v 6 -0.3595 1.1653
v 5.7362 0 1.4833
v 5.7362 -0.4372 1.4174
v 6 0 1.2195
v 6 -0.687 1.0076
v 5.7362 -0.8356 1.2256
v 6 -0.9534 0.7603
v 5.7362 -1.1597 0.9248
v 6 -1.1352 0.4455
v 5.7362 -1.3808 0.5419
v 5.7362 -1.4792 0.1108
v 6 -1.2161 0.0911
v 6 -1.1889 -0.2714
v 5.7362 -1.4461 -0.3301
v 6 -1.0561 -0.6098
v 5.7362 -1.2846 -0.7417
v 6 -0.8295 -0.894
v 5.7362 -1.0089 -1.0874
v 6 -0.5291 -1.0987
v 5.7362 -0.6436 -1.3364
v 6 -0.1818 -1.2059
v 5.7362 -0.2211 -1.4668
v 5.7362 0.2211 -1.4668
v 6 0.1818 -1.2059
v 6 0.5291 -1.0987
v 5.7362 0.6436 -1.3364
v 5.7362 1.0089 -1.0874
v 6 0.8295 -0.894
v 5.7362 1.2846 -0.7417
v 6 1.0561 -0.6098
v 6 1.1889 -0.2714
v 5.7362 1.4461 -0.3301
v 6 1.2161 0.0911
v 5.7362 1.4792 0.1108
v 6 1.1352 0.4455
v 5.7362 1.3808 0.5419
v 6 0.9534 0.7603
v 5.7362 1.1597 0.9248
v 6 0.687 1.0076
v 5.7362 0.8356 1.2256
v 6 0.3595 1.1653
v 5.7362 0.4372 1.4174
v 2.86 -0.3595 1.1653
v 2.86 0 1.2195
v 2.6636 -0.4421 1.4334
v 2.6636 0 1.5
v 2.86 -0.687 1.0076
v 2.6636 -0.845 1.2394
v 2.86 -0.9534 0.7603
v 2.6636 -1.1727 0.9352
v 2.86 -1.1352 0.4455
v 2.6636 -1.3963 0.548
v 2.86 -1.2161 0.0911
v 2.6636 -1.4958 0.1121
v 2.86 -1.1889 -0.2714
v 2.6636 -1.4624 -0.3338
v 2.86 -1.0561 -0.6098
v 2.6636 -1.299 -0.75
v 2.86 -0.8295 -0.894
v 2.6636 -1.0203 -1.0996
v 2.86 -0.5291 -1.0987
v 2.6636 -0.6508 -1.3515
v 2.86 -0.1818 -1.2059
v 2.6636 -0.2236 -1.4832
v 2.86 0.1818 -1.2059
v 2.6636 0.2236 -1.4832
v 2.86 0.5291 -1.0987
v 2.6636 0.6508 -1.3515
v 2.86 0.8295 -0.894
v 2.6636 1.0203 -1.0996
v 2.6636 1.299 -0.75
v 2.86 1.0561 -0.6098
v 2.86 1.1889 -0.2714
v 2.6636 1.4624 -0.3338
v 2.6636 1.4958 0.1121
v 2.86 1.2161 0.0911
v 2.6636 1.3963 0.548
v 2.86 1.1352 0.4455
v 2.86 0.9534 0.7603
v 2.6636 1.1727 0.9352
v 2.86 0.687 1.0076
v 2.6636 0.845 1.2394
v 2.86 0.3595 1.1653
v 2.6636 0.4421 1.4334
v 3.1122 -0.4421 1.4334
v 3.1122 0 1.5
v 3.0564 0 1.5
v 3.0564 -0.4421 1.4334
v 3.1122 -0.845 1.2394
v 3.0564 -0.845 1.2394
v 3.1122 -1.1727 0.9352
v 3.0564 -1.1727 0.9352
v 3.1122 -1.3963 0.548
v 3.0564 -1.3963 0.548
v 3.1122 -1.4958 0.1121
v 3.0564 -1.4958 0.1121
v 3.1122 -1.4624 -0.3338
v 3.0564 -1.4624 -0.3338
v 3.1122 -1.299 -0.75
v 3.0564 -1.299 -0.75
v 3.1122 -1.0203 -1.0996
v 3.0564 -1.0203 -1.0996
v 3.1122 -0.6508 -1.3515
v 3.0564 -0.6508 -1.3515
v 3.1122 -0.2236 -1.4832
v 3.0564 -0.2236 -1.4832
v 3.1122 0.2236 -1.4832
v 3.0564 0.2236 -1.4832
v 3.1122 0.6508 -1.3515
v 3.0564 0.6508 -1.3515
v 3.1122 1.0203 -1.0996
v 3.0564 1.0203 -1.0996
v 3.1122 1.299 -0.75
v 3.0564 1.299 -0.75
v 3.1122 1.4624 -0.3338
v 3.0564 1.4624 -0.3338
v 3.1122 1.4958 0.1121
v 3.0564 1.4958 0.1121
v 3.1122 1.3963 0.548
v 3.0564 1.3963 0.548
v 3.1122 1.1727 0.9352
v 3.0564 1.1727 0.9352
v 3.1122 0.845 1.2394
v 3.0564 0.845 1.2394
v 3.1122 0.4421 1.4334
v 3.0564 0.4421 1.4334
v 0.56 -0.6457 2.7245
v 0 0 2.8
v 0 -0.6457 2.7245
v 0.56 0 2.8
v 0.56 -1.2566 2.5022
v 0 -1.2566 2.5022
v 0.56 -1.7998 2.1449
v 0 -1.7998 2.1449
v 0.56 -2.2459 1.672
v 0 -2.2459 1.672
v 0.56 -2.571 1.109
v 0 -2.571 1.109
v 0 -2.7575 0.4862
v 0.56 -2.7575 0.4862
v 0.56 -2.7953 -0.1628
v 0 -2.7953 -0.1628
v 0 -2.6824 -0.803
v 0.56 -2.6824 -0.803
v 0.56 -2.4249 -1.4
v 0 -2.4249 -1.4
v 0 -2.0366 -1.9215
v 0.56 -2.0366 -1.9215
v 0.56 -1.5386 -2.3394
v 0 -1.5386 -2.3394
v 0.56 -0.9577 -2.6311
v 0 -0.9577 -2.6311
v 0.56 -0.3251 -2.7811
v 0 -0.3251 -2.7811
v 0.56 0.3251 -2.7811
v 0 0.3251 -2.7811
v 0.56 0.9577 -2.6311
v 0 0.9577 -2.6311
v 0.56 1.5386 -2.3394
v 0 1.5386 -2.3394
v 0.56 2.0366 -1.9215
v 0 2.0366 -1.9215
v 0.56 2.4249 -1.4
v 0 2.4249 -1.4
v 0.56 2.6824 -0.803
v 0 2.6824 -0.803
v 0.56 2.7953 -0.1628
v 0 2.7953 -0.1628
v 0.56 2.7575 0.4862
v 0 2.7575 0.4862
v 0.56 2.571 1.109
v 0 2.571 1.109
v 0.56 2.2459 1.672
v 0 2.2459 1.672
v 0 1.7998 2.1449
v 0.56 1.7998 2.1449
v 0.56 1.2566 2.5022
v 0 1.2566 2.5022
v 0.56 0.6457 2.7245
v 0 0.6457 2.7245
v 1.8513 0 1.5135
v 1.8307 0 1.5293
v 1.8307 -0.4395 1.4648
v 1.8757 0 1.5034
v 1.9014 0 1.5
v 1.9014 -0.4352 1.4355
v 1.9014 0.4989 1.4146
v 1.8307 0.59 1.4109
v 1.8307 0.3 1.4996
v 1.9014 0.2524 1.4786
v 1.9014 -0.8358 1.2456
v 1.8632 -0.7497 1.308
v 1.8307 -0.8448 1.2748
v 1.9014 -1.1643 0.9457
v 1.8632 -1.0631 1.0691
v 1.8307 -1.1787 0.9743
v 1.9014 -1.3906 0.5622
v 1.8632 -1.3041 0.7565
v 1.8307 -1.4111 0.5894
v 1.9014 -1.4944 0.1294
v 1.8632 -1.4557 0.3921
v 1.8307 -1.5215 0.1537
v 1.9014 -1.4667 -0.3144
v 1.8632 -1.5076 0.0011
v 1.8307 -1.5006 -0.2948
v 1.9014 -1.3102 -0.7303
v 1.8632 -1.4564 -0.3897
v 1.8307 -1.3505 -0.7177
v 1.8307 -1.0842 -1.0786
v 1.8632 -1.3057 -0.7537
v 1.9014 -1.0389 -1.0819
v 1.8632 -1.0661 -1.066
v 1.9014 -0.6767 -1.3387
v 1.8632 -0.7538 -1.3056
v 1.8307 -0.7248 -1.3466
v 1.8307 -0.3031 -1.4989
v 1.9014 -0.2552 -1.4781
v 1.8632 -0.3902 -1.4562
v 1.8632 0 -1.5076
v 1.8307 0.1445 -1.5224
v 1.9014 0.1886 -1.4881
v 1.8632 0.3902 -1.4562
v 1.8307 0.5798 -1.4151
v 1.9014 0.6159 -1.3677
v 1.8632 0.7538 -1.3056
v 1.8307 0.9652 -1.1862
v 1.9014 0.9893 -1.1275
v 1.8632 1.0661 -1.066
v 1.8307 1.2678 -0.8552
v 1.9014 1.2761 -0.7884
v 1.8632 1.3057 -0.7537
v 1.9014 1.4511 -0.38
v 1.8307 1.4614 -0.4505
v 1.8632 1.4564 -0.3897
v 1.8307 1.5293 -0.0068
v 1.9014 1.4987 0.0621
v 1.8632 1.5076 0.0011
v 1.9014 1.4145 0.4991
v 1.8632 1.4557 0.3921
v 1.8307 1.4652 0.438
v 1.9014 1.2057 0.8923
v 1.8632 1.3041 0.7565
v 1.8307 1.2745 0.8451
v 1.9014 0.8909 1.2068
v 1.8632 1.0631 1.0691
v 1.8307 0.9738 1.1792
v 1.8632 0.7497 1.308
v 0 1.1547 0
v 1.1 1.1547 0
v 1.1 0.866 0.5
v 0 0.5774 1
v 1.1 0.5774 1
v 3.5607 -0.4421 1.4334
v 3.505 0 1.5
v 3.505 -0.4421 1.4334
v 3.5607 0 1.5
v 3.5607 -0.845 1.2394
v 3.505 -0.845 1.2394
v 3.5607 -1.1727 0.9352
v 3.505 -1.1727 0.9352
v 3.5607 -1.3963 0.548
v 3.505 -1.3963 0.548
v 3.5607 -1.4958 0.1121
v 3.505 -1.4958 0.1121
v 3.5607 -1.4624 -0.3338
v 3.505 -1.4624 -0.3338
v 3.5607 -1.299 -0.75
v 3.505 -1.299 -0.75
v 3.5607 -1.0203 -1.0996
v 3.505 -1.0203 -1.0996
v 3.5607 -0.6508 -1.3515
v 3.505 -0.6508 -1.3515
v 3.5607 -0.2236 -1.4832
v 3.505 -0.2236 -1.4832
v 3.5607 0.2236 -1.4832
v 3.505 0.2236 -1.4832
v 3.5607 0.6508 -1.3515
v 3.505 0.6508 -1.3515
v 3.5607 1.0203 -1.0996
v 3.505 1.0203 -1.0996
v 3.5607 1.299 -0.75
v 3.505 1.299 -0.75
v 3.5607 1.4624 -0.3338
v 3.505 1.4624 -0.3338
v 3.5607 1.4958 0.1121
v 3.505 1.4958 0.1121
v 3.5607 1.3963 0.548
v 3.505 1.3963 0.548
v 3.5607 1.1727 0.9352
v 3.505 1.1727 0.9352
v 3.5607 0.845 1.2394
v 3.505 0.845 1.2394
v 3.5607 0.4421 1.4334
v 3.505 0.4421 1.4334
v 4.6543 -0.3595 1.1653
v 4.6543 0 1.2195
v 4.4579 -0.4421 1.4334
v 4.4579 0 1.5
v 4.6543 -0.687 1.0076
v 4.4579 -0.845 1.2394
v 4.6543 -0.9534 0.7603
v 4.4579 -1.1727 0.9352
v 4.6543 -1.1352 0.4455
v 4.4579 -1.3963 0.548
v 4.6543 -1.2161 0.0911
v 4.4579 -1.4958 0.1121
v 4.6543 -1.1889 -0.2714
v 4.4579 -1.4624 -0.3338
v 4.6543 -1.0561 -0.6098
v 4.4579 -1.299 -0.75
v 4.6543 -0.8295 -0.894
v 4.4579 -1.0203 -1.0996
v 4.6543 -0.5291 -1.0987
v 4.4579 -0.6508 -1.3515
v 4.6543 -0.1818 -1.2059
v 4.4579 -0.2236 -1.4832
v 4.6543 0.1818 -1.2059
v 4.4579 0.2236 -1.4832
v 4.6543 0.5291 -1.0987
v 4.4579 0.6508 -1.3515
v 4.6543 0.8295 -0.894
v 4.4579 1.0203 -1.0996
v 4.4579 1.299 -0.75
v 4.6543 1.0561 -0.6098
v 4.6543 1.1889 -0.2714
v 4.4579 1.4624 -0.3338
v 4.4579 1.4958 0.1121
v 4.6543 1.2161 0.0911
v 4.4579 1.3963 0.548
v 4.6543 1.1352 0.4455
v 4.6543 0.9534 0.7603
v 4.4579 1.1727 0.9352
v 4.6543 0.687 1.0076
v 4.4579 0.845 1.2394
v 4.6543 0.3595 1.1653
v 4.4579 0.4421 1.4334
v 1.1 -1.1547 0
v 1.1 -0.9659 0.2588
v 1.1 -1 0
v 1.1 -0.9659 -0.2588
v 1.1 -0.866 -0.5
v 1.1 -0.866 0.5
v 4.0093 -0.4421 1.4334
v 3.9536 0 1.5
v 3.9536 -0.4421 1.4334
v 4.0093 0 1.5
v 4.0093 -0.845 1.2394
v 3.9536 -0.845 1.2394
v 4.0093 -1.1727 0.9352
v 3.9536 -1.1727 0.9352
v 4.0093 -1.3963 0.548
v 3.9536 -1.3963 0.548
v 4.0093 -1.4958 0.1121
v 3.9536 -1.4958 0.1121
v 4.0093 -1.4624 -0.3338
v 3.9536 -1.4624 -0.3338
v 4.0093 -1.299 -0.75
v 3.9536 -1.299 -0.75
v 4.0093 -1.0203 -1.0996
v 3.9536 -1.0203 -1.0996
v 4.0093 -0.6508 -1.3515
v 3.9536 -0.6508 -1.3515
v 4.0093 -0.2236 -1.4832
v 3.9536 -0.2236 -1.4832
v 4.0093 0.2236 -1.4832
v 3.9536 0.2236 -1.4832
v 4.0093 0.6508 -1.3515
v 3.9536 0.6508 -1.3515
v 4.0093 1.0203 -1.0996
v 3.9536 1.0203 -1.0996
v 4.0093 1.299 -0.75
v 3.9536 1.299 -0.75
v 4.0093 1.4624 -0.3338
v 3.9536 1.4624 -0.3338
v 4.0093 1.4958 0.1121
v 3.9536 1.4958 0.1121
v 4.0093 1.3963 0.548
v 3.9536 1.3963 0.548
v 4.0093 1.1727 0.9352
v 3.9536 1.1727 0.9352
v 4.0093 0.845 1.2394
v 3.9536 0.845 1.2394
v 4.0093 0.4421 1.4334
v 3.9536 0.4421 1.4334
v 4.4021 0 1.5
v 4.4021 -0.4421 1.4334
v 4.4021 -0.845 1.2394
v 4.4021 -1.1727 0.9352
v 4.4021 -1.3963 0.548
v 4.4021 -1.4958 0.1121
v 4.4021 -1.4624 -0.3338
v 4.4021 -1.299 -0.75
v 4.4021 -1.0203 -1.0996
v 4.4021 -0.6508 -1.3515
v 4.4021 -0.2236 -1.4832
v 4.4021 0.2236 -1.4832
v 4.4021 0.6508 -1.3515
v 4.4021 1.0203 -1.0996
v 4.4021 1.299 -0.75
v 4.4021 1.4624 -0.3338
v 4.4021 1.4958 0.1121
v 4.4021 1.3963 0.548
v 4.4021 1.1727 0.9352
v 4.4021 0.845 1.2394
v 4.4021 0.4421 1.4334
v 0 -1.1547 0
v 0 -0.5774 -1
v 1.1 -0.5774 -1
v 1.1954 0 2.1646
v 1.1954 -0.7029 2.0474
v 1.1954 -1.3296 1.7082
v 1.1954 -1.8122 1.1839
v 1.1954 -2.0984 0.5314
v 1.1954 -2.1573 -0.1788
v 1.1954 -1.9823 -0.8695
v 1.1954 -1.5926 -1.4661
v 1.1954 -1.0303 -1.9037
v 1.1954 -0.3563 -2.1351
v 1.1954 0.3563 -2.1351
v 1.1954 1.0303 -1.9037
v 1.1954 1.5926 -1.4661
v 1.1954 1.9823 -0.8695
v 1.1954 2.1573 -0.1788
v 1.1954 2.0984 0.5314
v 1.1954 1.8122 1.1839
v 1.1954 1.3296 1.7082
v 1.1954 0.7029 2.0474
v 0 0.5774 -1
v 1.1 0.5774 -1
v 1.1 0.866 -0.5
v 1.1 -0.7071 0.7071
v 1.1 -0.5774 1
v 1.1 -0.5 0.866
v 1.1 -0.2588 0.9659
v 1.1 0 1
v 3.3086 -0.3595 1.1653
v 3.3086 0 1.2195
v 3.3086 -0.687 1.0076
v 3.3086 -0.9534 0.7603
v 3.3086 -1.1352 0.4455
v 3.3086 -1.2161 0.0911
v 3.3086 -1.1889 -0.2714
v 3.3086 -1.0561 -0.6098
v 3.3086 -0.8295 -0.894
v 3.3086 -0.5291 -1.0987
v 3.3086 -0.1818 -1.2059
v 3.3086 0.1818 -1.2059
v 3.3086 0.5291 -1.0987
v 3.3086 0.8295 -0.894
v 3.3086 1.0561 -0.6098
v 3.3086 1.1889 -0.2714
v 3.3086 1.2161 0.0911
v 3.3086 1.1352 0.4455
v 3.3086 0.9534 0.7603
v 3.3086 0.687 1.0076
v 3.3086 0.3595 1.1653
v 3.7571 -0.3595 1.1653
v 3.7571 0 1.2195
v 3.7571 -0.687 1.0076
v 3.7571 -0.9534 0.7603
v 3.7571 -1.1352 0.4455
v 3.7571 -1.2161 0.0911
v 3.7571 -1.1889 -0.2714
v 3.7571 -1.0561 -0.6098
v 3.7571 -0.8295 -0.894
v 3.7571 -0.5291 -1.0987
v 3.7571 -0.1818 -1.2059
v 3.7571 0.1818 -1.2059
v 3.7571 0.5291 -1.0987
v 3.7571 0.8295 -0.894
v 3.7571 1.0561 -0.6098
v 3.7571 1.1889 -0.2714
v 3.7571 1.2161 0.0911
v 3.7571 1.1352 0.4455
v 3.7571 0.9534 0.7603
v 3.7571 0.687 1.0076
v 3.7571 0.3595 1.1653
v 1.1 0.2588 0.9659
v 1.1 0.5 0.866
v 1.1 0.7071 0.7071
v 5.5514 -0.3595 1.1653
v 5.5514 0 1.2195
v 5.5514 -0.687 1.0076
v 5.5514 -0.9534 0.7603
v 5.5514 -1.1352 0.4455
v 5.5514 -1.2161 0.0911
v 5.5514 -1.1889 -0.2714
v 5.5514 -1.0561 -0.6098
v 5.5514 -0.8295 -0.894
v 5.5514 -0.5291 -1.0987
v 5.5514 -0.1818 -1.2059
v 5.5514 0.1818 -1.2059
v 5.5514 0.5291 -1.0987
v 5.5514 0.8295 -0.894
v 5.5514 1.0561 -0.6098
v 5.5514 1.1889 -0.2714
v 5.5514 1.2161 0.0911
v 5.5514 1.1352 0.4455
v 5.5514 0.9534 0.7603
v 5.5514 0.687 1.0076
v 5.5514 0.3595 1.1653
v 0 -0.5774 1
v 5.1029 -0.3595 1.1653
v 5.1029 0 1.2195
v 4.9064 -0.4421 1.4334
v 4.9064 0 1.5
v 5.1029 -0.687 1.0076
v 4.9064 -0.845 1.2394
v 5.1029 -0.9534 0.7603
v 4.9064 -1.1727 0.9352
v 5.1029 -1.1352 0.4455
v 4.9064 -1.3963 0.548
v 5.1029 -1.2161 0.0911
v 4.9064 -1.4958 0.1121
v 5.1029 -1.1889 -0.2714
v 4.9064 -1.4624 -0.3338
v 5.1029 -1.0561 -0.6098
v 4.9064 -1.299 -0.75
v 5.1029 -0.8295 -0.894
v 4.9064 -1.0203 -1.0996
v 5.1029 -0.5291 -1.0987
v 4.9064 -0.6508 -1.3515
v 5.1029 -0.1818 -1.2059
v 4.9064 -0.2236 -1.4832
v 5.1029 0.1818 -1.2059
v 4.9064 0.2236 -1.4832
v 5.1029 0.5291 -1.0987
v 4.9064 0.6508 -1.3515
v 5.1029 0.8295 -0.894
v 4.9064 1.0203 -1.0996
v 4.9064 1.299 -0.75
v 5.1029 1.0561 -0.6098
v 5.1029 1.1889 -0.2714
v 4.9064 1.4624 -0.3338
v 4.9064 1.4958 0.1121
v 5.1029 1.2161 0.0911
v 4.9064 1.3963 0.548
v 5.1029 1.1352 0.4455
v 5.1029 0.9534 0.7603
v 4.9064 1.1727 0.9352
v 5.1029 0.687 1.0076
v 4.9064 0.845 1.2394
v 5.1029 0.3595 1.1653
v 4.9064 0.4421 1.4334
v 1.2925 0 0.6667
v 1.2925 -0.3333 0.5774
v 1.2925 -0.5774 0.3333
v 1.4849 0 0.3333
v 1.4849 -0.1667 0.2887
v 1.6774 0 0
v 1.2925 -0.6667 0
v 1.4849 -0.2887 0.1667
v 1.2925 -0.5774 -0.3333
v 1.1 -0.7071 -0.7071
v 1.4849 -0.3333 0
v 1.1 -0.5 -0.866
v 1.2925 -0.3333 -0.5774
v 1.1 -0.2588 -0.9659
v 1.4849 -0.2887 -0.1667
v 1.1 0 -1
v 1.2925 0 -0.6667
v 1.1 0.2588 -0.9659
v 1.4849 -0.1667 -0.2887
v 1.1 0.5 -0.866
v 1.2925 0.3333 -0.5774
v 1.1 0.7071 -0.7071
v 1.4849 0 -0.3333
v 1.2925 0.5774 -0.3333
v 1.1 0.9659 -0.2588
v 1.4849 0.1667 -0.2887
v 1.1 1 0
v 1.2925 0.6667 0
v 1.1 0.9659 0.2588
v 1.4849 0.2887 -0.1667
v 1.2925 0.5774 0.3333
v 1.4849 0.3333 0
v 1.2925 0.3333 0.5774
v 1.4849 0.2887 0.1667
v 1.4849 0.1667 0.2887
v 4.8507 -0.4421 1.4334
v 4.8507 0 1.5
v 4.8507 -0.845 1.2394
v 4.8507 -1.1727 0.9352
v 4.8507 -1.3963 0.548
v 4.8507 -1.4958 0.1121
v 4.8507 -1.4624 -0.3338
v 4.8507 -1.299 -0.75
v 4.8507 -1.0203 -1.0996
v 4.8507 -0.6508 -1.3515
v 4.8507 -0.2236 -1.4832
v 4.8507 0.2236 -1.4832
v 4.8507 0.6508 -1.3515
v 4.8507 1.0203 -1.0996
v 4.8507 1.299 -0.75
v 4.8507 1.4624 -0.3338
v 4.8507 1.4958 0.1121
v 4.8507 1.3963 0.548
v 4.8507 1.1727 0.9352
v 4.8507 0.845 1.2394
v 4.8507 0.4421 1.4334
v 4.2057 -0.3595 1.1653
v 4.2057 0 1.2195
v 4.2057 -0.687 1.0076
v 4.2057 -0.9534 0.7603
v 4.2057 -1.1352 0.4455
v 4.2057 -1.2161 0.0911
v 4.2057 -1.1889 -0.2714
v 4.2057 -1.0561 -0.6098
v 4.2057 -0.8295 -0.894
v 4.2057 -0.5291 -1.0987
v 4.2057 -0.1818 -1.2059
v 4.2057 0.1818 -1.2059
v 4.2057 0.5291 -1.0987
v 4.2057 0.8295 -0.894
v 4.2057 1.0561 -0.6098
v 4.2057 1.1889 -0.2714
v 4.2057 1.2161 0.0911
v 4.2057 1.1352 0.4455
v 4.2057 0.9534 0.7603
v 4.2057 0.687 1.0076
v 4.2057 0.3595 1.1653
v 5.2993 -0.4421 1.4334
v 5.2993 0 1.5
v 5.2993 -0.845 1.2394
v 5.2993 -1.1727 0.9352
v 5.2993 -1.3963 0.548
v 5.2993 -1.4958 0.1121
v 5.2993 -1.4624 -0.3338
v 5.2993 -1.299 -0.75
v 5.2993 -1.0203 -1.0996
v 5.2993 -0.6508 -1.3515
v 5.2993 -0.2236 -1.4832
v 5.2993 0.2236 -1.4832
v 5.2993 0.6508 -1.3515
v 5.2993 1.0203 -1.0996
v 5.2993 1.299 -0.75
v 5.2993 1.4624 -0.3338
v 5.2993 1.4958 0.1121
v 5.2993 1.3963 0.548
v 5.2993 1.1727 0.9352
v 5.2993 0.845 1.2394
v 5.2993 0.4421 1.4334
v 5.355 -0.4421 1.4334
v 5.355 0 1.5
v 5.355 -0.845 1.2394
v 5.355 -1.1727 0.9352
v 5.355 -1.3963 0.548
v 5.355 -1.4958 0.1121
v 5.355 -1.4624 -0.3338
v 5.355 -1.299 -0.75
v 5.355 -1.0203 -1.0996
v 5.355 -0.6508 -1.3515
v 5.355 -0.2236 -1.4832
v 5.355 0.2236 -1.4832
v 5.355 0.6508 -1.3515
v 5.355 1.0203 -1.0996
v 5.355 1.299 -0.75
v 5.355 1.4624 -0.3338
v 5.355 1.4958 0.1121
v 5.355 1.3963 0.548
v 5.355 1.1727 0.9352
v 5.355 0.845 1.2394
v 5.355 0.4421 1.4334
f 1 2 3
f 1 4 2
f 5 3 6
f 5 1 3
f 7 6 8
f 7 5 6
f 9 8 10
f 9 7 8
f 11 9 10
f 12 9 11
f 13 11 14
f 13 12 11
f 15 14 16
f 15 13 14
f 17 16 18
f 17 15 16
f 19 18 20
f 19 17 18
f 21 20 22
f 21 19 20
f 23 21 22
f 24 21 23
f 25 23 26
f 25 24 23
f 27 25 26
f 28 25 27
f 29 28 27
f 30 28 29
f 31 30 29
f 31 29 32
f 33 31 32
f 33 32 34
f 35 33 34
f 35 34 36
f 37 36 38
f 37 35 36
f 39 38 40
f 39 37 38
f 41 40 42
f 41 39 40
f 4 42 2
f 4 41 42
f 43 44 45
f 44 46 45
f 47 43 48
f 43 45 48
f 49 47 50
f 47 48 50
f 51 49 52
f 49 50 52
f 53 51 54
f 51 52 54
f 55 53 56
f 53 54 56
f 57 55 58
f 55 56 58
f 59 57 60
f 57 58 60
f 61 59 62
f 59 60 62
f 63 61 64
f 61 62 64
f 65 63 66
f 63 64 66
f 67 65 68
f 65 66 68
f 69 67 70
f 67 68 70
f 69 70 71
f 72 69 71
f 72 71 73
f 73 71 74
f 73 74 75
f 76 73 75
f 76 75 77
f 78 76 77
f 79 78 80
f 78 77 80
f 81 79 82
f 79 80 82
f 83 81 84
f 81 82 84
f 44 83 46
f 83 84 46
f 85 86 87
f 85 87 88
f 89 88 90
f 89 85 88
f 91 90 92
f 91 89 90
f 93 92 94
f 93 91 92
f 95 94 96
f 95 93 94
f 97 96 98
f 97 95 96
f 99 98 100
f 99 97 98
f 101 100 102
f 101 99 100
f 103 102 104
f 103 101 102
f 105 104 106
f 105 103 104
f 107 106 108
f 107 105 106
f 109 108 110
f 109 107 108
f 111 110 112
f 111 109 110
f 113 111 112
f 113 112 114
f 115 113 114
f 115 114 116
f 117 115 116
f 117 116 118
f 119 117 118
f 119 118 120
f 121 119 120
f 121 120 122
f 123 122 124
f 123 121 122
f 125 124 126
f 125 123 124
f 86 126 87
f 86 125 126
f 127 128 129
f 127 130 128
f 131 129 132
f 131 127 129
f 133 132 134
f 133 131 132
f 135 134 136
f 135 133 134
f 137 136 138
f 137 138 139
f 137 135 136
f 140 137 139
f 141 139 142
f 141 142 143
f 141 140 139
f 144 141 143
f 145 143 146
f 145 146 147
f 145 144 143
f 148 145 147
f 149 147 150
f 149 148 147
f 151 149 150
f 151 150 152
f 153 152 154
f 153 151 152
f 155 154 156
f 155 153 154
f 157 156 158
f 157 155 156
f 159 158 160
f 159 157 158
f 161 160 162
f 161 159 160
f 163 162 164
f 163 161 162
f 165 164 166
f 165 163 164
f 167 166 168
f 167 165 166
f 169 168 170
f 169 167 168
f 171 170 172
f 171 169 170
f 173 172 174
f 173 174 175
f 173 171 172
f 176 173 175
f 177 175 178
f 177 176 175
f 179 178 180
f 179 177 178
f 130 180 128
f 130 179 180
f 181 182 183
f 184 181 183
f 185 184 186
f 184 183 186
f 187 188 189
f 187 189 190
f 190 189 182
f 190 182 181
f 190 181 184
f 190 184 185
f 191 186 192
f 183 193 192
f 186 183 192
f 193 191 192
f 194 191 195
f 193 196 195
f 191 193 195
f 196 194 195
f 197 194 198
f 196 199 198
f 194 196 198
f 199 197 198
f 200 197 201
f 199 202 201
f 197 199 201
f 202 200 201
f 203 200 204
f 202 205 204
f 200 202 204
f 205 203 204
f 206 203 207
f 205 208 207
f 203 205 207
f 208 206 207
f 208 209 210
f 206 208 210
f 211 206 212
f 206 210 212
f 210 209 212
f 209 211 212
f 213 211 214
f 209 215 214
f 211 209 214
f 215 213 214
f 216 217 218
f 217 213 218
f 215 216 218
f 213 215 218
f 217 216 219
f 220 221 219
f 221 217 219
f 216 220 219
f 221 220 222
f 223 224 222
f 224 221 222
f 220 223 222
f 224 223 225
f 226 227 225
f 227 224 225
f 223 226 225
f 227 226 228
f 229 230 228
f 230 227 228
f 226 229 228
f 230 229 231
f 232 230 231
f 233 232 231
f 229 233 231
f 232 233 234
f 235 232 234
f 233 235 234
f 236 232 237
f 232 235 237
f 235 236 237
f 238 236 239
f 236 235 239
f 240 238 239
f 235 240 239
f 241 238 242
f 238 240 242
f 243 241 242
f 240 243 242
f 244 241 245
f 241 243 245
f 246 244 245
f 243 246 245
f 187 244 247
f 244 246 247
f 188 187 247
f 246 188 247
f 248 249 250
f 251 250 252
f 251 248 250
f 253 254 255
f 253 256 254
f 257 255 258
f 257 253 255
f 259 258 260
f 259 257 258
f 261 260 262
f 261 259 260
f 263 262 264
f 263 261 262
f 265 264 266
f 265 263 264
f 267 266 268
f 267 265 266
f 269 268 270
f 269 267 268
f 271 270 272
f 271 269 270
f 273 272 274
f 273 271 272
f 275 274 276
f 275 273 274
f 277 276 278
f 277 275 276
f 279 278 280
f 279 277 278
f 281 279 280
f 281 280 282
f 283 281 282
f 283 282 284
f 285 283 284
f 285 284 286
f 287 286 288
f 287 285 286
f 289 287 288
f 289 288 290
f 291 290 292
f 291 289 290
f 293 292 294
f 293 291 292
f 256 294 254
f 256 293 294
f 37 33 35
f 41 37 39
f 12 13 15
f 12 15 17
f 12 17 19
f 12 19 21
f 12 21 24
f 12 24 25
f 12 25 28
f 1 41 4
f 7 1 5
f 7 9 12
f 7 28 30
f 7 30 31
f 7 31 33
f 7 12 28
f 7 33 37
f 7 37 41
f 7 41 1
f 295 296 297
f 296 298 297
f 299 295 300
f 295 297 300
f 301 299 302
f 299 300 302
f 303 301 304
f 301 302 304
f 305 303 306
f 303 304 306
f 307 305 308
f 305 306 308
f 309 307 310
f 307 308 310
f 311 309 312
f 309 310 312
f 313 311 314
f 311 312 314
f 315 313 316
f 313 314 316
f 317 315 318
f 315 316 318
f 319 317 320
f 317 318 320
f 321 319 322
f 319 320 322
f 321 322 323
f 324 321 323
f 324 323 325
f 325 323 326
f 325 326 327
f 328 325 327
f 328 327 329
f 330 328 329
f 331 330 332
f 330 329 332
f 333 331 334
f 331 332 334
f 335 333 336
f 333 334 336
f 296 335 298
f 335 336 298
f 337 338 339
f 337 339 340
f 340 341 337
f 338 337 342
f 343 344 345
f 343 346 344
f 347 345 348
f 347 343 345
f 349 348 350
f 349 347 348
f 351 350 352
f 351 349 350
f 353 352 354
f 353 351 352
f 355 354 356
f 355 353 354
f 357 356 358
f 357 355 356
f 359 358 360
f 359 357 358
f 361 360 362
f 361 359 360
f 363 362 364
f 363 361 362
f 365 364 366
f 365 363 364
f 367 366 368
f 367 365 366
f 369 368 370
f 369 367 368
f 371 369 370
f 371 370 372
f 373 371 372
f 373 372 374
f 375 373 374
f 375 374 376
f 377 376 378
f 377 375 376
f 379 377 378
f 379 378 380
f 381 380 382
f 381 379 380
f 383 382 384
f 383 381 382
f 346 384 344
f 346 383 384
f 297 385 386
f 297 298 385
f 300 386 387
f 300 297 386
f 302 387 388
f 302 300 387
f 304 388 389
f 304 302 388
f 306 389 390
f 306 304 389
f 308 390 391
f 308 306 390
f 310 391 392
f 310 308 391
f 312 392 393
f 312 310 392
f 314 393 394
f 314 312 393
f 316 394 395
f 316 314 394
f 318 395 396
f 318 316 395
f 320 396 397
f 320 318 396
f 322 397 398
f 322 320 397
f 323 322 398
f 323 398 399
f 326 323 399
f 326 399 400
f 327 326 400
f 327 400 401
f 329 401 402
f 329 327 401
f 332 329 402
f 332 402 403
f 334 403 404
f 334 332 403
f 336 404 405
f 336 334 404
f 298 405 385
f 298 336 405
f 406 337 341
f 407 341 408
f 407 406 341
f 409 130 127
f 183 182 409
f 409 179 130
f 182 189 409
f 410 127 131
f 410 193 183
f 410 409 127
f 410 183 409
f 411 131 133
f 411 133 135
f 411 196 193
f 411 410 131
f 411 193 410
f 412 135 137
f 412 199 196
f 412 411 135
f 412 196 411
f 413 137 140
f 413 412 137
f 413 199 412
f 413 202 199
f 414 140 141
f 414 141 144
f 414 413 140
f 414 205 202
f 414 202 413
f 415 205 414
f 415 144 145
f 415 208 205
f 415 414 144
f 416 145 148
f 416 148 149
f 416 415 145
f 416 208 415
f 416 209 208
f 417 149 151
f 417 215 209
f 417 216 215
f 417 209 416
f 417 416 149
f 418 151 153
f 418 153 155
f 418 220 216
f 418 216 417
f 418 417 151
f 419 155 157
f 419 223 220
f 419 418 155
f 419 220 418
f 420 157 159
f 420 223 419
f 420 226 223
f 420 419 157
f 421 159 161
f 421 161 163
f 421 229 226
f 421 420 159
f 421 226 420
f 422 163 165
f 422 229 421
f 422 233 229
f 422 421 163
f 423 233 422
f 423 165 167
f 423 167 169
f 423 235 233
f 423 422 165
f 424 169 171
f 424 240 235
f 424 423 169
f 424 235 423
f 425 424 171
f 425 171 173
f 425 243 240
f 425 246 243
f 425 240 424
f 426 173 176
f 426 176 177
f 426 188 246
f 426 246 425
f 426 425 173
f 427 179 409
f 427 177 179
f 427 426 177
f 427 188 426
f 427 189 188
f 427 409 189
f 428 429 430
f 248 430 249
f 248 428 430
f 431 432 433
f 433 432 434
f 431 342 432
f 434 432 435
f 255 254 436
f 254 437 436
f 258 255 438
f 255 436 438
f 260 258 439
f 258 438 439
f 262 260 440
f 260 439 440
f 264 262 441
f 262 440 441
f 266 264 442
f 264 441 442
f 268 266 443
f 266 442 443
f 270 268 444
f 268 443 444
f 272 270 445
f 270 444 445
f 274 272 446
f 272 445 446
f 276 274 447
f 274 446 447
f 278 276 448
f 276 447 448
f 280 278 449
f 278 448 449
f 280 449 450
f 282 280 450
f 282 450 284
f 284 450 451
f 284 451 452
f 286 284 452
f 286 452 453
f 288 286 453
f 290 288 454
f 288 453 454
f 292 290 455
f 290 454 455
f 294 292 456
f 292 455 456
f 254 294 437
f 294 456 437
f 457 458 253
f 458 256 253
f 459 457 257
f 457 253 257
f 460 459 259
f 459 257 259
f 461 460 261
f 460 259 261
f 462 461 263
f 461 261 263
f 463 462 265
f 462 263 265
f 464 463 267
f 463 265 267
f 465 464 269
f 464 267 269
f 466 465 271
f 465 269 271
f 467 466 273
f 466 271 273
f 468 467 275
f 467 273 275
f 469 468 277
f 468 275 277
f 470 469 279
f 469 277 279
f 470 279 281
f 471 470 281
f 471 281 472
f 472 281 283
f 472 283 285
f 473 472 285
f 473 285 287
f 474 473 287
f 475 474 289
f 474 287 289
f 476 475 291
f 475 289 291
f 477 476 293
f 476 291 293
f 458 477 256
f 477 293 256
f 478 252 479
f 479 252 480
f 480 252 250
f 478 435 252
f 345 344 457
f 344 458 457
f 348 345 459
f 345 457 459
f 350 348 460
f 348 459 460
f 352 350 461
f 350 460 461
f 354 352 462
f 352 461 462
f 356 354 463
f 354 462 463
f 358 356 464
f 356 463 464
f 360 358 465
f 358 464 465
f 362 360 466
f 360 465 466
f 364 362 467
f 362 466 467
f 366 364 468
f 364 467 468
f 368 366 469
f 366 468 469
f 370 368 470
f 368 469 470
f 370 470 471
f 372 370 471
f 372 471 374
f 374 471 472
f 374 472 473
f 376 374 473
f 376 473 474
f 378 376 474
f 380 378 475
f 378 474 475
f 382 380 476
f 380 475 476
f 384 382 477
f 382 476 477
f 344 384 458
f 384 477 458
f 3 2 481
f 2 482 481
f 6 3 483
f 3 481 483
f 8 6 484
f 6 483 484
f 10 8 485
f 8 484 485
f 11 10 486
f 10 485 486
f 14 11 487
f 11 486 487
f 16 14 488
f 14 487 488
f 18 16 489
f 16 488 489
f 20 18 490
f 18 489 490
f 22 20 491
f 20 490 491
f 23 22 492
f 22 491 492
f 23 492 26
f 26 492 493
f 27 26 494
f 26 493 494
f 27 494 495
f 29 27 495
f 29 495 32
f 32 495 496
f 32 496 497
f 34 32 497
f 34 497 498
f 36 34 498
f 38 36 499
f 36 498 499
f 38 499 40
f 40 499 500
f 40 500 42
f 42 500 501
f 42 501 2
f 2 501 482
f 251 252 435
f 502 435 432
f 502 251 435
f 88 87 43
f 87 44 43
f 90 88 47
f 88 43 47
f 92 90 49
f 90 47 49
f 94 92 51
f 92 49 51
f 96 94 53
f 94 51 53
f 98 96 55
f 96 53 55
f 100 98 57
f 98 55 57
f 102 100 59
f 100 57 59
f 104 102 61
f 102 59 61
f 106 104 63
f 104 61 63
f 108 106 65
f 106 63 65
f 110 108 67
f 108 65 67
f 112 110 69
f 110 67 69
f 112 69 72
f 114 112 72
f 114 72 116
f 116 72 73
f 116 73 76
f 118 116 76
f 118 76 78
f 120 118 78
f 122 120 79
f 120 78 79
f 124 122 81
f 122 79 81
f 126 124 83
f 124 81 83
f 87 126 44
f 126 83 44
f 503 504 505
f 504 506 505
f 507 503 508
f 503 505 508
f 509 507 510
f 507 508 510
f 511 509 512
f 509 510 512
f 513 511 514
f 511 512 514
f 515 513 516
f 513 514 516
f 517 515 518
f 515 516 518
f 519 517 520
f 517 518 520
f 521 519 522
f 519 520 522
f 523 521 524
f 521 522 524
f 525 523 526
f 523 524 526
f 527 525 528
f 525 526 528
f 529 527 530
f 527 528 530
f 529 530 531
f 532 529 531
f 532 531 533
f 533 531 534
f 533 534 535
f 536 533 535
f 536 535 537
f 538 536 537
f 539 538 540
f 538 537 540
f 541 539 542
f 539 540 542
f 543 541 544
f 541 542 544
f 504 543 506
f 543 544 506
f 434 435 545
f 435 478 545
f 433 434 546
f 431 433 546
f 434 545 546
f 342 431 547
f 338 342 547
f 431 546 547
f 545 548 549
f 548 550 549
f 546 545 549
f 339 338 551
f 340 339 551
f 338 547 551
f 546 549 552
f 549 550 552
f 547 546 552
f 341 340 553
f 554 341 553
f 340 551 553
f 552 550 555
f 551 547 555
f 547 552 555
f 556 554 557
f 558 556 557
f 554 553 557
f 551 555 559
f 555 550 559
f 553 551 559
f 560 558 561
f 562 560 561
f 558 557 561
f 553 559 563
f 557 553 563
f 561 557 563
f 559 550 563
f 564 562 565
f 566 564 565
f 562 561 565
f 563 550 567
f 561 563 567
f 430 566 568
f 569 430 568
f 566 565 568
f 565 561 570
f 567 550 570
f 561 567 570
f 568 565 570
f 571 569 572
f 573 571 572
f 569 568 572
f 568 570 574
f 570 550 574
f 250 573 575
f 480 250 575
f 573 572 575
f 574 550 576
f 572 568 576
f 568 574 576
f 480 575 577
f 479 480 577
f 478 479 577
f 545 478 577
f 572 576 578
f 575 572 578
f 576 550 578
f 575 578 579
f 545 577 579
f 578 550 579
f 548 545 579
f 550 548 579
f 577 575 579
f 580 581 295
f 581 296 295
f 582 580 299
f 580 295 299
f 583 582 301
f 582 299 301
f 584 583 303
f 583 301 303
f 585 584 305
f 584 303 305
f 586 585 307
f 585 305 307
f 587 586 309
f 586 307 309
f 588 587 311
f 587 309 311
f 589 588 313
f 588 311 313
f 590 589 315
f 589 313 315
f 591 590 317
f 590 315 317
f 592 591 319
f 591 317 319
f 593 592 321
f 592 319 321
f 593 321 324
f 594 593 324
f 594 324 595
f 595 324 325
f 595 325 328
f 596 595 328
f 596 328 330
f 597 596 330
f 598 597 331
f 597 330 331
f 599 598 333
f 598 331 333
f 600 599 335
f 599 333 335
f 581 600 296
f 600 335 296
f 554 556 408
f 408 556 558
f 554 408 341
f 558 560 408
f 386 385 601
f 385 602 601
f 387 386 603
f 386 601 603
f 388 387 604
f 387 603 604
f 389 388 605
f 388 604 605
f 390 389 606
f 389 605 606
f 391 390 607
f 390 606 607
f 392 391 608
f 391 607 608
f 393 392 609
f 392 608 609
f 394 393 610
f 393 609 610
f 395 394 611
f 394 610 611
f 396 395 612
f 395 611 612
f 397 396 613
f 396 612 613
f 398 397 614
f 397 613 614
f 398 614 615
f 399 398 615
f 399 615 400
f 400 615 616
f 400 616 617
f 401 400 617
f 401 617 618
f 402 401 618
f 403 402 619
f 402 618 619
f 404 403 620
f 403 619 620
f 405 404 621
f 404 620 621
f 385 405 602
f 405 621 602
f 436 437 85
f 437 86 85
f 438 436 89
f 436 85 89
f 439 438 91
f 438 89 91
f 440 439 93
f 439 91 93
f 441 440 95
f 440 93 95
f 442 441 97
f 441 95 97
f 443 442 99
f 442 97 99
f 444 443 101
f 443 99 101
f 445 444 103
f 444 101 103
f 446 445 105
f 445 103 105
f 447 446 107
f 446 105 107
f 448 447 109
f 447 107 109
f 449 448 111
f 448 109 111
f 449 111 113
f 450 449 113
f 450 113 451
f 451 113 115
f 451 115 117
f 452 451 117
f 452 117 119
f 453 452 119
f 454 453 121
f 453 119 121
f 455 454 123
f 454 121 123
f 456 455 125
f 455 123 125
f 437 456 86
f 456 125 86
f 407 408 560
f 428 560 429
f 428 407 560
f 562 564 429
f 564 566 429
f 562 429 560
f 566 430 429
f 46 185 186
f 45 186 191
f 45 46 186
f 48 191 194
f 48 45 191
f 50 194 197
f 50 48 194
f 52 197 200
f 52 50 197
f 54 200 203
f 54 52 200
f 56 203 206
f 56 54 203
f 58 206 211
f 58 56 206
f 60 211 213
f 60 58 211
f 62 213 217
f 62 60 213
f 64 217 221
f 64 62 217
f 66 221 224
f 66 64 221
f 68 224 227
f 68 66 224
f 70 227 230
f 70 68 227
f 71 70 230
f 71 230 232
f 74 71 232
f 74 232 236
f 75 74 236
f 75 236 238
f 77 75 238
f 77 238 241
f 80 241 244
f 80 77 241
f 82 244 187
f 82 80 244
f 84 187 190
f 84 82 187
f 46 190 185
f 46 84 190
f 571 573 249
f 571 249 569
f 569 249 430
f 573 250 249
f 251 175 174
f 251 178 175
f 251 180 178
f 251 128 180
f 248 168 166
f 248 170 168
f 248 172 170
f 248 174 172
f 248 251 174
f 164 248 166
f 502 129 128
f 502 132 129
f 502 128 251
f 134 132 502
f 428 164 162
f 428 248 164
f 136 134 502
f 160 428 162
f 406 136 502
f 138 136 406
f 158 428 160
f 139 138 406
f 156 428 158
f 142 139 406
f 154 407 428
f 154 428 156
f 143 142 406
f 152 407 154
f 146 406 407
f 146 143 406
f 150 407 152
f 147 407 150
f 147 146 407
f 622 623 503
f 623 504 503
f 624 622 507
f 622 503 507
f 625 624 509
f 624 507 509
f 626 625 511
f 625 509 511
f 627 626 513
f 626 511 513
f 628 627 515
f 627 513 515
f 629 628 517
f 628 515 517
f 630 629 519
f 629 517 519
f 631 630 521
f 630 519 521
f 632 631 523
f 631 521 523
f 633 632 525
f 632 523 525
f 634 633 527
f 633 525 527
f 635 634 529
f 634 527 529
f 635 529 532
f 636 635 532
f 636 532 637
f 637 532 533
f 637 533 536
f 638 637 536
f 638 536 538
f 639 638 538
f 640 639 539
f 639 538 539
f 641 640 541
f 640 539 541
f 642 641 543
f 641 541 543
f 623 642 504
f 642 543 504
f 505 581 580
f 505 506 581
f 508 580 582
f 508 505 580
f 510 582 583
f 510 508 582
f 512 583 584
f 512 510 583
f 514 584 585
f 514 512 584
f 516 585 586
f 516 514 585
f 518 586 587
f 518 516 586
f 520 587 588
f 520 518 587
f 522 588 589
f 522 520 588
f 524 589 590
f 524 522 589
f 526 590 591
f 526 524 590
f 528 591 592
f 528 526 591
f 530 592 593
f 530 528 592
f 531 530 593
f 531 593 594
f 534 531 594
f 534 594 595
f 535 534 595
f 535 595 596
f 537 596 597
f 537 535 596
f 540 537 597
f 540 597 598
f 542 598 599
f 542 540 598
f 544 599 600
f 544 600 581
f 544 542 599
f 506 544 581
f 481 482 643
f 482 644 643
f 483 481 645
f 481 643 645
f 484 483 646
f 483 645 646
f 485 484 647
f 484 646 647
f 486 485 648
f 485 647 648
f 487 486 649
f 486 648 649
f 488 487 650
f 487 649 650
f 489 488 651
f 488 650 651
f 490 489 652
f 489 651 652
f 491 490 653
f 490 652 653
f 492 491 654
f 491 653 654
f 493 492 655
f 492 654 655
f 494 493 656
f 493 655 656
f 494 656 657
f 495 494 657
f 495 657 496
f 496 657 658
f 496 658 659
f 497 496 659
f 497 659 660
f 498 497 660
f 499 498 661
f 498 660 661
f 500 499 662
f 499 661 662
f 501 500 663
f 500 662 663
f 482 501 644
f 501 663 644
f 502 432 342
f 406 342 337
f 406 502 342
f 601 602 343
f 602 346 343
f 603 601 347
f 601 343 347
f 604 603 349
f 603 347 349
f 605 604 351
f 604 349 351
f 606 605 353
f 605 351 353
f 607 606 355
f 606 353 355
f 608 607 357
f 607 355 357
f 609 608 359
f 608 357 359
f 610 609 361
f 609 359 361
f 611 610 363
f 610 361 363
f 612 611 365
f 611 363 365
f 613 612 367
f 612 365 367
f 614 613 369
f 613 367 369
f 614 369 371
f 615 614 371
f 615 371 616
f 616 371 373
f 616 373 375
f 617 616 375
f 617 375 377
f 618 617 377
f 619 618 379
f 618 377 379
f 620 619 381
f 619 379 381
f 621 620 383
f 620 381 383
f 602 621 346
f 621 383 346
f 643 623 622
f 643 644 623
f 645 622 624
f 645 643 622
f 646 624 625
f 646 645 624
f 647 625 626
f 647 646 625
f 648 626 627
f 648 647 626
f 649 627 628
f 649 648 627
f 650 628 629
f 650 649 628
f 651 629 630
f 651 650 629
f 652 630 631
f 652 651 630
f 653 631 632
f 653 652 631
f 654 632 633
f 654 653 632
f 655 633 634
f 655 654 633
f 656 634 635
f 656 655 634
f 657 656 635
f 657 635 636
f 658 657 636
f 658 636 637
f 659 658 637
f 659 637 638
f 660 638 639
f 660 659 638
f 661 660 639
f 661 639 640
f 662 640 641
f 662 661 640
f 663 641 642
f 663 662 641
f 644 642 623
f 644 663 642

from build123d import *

# Parameters (mm, degrees)
FILLET1_R       = 0.1
HEX_2_DEPTH     = 1.1
THDSCHPAT_COUNT = 7
THDSCHPAT_PITCH = 0.448571429


with BuildPart() as part:
    # BodySke → BaseBody (revolve)
    with BuildSketch(Plane.XY, mode=Mode.PRIVATE) as basebody_sk:
        Polygon((0, 0), (0, 2.8), (0.56, 2.8), (1.86, 1.5), (5.7195, 1.5), (6, 1.2195), (6, 0), align=None)
    revolve(basebody_sk.sketch.rotate(Axis((0, 0, 0), (1, 0, 0)), 90), axis=Axis((0, 0, 0), (1, 0, 0)))

    # Fillet1
    fillet1_edges = [part.edges().sort_by_distance(p)[0] for p in [
        (1.86, 0, -1.5),
    ]]
    fillet(fillet1_edges, radius=FILLET1_R)

    # Sketch2 → PreBroach (revolve, cut)
    with BuildSketch(Plane.XY, mode=Mode.PRIVATE) as prebroach_sk:
        Polygon((0, 1), (1.1, 1), (1.677350269, 0), (0, 0), align=None)
    revolve(prebroach_sk.sketch.rotate(Axis((0, 0, 0), (1, 0, 0)), 90), axis=Axis((0, 0, 0), (1, 0, 0)), mode=Mode.SUBTRACT)

    # Sketch3 → Hex 2 (cut)
    with BuildSketch(Plane.ZY):
        Polygon((-1, -0.577350269), (-1, 0.577350269), (0, 1.154700538), (1, 0.577350269), (1, -0.577350269), (0, -1.154700538), align=None)
    extrude(amount=-HEX_2_DEPTH, mode=Mode.SUBTRACT)

    # ThdSchSke → ThreadSchematic (revolve, cut)
    with BuildSketch(Plane.XY, mode=Mode.PRIVATE) as threadschematic_sk:
        Polygon((2.860001, -1.2195), (2.663592786, -1.5), (2.663592786, -1.875), (3.056409214, -1.875), (3.056409214, -1.5), align=None)
    threadschematic = revolve(threadschematic_sk.sketch.rotate(Axis((-3.175, 0, 0), (1, 0, 0)), 270), axis=Axis((-3.175, 0, 0), (1, 0, 0)), mode=Mode.SUBTRACT)

    # ThdSchPat: ThreadSchematic ×7
    with Locations(*[(i * THDSCHPAT_PITCH, 0, 0) for i in range(1, THDSCHPAT_COUNT)]):
        add(threadschematic, mode=Mode.SUBTRACT)


solid = part.part
